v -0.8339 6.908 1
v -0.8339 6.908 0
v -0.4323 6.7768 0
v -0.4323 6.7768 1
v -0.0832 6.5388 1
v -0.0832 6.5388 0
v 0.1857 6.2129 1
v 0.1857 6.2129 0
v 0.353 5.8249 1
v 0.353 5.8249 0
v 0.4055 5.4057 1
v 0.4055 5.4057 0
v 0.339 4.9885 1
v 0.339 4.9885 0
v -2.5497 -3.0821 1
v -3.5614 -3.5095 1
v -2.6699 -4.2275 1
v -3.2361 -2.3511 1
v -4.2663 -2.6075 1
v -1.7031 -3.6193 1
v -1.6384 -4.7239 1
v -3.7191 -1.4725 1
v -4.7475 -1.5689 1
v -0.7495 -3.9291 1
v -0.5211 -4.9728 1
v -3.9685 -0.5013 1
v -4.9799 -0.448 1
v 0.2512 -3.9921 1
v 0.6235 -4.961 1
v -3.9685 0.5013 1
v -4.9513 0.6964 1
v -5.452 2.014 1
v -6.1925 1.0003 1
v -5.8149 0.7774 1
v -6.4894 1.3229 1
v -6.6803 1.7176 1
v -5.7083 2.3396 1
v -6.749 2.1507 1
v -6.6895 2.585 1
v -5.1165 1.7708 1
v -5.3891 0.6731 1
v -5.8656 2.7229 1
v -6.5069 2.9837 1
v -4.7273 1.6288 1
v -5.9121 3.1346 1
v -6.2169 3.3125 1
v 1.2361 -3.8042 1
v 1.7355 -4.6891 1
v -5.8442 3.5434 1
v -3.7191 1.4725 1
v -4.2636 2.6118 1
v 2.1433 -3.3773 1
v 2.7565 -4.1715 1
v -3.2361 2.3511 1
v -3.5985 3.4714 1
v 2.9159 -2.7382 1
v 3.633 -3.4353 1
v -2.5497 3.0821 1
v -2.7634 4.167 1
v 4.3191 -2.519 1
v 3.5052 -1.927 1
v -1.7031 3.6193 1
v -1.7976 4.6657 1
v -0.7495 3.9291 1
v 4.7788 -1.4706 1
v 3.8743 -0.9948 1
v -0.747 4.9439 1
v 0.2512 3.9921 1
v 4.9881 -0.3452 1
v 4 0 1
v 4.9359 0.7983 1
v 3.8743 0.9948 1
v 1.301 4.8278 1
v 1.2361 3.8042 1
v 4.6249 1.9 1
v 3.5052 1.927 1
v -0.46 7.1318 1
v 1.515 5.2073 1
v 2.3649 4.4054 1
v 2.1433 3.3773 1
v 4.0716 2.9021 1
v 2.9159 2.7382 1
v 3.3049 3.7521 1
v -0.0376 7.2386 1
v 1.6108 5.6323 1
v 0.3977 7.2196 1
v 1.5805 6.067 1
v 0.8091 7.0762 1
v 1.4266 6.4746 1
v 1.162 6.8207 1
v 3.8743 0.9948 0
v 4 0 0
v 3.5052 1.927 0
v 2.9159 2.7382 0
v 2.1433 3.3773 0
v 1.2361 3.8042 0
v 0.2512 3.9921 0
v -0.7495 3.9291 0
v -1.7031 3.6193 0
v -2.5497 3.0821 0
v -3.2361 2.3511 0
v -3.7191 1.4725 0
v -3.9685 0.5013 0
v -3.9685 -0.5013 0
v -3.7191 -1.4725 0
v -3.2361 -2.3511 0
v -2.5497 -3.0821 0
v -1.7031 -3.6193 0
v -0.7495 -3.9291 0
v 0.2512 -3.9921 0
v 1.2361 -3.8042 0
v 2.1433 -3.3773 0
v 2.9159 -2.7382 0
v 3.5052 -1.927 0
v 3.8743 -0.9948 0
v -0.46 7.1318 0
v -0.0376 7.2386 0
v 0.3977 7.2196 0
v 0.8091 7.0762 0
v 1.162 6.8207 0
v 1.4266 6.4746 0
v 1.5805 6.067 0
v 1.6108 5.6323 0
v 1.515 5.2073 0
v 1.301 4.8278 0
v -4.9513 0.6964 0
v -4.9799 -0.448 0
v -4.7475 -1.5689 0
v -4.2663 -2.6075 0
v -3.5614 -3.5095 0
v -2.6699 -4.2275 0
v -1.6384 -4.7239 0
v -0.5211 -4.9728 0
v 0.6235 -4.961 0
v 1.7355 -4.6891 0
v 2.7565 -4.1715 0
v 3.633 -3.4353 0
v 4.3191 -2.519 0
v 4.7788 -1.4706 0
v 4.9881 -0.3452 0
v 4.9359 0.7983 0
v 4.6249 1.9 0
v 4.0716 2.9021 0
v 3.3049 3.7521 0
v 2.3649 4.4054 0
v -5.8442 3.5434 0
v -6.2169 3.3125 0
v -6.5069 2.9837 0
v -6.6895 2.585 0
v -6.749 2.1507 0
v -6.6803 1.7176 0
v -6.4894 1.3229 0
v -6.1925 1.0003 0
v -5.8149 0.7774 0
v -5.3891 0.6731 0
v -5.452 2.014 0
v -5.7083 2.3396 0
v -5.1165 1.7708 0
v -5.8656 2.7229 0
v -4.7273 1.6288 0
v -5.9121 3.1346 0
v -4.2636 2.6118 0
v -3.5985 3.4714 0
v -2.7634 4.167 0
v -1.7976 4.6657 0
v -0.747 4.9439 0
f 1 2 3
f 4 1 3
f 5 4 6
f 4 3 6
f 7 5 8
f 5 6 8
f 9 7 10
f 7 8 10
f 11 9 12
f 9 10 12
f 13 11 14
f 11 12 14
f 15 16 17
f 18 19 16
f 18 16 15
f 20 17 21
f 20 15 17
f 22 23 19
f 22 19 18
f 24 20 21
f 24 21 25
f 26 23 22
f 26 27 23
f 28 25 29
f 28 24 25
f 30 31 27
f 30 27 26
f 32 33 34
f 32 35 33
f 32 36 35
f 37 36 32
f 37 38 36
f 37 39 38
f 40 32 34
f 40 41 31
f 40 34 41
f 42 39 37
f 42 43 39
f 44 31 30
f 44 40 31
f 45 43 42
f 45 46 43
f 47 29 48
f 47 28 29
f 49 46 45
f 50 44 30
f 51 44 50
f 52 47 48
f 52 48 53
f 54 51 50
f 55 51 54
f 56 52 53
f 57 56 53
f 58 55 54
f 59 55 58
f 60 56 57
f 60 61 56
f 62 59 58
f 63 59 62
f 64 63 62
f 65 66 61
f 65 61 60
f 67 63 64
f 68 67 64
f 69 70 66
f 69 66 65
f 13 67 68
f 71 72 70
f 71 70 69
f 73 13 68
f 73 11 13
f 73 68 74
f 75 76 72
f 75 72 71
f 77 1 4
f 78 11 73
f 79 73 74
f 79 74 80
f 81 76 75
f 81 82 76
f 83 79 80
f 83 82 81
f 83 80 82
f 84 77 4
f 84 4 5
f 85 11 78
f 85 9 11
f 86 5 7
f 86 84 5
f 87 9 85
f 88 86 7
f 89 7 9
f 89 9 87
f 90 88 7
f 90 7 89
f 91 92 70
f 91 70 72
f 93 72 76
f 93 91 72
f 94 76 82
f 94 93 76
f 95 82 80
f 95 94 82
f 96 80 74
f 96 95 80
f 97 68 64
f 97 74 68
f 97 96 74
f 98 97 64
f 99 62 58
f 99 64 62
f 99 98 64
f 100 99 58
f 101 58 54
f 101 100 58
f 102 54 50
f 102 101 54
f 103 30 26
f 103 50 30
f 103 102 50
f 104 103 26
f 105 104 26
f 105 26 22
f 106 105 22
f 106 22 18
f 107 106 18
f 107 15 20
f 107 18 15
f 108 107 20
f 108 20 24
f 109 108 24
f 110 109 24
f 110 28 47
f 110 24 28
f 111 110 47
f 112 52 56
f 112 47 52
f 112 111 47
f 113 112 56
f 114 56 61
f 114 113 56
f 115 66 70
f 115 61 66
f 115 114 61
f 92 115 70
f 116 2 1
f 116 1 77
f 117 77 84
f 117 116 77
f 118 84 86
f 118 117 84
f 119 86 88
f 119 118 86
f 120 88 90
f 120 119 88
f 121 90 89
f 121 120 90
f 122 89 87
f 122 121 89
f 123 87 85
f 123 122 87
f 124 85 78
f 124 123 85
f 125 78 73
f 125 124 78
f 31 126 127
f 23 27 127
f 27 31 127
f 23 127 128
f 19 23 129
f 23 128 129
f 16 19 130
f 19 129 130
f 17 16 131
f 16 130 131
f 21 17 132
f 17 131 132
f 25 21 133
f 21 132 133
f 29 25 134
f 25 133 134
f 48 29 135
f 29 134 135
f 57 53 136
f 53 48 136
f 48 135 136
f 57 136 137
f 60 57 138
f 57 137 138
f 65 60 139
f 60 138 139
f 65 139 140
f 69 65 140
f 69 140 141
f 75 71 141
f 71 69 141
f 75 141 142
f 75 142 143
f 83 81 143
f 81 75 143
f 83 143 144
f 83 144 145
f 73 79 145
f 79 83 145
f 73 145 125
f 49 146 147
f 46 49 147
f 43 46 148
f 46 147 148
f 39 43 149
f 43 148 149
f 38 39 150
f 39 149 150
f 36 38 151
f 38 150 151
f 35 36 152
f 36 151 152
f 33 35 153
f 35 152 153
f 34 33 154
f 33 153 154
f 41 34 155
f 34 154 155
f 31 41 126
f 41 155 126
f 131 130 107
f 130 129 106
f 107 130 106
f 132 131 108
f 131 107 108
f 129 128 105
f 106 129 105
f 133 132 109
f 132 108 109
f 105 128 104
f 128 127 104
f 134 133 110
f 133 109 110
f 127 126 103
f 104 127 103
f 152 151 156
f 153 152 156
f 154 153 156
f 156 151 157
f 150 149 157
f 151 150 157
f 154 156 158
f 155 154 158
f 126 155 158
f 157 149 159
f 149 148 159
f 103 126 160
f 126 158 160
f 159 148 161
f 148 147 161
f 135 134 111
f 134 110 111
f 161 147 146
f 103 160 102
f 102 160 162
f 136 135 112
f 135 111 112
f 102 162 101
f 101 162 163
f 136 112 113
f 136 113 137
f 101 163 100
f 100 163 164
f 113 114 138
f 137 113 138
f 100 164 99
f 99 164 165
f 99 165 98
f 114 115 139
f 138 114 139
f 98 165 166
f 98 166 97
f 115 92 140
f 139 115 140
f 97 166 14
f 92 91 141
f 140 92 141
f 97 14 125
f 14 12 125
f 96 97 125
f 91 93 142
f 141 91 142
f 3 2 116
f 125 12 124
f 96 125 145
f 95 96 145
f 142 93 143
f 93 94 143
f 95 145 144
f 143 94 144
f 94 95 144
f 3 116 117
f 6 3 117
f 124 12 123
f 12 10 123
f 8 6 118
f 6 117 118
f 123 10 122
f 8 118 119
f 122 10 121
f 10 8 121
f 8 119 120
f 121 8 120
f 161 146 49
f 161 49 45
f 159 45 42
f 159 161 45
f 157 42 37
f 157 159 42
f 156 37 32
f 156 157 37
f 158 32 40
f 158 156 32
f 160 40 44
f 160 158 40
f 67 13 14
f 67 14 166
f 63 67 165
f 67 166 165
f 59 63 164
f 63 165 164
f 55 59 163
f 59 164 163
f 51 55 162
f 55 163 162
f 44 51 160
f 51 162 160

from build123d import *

# Parameters (mm, degrees)
CYLINDER004_R          = 1.5
CYLINDER004_DEPTH      = 1
CYLINDER002_R          = 1.5
CYLINDER002_DEPTH      = 1
CUT001_PLACEMENT_ANGLE = 318
MIRROR_PLACEMENT_ANGLE = 32
CYLINDER001_R          = 4
CYLINDER001_DEPTH      = 10
CYLINDER_R             = 5
CYLINDER_DEPTH         = 1


with BuildPart() as cylinder004:
    # Cylinder004 → Cylinder004 (new body)
    with BuildSketch(Plane(origin=(-5.5, 3.25, 0), x_dir=(1, 0, 0), z_dir=(0, 0, 1))):
        Circle(CYLINDER004_R)
    extrude(amount=CYLINDER004_DEPTH)


with BuildPart() as cut001:
    # Cylinder002 → Cylinder002 (new body)
    with BuildSketch(Plane(origin=(-5.5, 2, 0), x_dir=(1, 0, 0), z_dir=(0, 0, 1))):
        Circle(CYLINDER002_R)
    extrude(amount=CYLINDER002_DEPTH)

    # Cut001: cut Cylinder004
    add(cylinder004.part, mode=Mode.SUBTRACT)


with BuildPart() as cut001_1:
    # Cut001 placement: moved
    add(cut001.part.moved(Location((-2.5, -3, 0))).rotate(Axis((-2.5, -3, 0), (0, 0, 1)), CUT001_PLACEMENT_ANGLE))


with BuildPart() as cut001_mirrored:
    # Mirror: instance of Cut001
    add(cut001_1.part.mirror(Plane(origin=(-5.416318, 1.980722, 0), x_dir=(0.264078, -0.964501, 0), z_dir=(0.964501, 0.264078, 0))))


with BuildPart() as cut001_mirrored_1:
    # Mirror placement: moved
    add(cut001_mirrored.part.moved(Location((6, 7, 0))).rotate(Axis((6, 7, 0), (0, 0, 1)), MIRROR_PLACEMENT_ANGLE))


with BuildPart() as cylinder001:
    # Cylinder001 → Cylinder001 (new body)
    with BuildSketch(Plane.XY.offset(-5)):
        Circle(CYLINDER001_R)
    extrude(amount=CYLINDER001_DEPTH)


with BuildPart() as cut:
    # Cylinder → Cylinder (new body)
    with BuildSketch(Plane.XY):
        Circle(CYLINDER_R)
    extrude(amount=CYLINDER_DEPTH)

    # Cut: cut Cylinder001
    add(cylinder001.part, mode=Mode.SUBTRACT)


with BuildPart() as fusion:
    # Fusion base: copy of Cut001
    add(cut001_1.part)

    # Fusion: union Cut001 (mirrored), Cut
    add(cut001_mirrored_1.part)
    add(cut.part)


solid = fusion.part
